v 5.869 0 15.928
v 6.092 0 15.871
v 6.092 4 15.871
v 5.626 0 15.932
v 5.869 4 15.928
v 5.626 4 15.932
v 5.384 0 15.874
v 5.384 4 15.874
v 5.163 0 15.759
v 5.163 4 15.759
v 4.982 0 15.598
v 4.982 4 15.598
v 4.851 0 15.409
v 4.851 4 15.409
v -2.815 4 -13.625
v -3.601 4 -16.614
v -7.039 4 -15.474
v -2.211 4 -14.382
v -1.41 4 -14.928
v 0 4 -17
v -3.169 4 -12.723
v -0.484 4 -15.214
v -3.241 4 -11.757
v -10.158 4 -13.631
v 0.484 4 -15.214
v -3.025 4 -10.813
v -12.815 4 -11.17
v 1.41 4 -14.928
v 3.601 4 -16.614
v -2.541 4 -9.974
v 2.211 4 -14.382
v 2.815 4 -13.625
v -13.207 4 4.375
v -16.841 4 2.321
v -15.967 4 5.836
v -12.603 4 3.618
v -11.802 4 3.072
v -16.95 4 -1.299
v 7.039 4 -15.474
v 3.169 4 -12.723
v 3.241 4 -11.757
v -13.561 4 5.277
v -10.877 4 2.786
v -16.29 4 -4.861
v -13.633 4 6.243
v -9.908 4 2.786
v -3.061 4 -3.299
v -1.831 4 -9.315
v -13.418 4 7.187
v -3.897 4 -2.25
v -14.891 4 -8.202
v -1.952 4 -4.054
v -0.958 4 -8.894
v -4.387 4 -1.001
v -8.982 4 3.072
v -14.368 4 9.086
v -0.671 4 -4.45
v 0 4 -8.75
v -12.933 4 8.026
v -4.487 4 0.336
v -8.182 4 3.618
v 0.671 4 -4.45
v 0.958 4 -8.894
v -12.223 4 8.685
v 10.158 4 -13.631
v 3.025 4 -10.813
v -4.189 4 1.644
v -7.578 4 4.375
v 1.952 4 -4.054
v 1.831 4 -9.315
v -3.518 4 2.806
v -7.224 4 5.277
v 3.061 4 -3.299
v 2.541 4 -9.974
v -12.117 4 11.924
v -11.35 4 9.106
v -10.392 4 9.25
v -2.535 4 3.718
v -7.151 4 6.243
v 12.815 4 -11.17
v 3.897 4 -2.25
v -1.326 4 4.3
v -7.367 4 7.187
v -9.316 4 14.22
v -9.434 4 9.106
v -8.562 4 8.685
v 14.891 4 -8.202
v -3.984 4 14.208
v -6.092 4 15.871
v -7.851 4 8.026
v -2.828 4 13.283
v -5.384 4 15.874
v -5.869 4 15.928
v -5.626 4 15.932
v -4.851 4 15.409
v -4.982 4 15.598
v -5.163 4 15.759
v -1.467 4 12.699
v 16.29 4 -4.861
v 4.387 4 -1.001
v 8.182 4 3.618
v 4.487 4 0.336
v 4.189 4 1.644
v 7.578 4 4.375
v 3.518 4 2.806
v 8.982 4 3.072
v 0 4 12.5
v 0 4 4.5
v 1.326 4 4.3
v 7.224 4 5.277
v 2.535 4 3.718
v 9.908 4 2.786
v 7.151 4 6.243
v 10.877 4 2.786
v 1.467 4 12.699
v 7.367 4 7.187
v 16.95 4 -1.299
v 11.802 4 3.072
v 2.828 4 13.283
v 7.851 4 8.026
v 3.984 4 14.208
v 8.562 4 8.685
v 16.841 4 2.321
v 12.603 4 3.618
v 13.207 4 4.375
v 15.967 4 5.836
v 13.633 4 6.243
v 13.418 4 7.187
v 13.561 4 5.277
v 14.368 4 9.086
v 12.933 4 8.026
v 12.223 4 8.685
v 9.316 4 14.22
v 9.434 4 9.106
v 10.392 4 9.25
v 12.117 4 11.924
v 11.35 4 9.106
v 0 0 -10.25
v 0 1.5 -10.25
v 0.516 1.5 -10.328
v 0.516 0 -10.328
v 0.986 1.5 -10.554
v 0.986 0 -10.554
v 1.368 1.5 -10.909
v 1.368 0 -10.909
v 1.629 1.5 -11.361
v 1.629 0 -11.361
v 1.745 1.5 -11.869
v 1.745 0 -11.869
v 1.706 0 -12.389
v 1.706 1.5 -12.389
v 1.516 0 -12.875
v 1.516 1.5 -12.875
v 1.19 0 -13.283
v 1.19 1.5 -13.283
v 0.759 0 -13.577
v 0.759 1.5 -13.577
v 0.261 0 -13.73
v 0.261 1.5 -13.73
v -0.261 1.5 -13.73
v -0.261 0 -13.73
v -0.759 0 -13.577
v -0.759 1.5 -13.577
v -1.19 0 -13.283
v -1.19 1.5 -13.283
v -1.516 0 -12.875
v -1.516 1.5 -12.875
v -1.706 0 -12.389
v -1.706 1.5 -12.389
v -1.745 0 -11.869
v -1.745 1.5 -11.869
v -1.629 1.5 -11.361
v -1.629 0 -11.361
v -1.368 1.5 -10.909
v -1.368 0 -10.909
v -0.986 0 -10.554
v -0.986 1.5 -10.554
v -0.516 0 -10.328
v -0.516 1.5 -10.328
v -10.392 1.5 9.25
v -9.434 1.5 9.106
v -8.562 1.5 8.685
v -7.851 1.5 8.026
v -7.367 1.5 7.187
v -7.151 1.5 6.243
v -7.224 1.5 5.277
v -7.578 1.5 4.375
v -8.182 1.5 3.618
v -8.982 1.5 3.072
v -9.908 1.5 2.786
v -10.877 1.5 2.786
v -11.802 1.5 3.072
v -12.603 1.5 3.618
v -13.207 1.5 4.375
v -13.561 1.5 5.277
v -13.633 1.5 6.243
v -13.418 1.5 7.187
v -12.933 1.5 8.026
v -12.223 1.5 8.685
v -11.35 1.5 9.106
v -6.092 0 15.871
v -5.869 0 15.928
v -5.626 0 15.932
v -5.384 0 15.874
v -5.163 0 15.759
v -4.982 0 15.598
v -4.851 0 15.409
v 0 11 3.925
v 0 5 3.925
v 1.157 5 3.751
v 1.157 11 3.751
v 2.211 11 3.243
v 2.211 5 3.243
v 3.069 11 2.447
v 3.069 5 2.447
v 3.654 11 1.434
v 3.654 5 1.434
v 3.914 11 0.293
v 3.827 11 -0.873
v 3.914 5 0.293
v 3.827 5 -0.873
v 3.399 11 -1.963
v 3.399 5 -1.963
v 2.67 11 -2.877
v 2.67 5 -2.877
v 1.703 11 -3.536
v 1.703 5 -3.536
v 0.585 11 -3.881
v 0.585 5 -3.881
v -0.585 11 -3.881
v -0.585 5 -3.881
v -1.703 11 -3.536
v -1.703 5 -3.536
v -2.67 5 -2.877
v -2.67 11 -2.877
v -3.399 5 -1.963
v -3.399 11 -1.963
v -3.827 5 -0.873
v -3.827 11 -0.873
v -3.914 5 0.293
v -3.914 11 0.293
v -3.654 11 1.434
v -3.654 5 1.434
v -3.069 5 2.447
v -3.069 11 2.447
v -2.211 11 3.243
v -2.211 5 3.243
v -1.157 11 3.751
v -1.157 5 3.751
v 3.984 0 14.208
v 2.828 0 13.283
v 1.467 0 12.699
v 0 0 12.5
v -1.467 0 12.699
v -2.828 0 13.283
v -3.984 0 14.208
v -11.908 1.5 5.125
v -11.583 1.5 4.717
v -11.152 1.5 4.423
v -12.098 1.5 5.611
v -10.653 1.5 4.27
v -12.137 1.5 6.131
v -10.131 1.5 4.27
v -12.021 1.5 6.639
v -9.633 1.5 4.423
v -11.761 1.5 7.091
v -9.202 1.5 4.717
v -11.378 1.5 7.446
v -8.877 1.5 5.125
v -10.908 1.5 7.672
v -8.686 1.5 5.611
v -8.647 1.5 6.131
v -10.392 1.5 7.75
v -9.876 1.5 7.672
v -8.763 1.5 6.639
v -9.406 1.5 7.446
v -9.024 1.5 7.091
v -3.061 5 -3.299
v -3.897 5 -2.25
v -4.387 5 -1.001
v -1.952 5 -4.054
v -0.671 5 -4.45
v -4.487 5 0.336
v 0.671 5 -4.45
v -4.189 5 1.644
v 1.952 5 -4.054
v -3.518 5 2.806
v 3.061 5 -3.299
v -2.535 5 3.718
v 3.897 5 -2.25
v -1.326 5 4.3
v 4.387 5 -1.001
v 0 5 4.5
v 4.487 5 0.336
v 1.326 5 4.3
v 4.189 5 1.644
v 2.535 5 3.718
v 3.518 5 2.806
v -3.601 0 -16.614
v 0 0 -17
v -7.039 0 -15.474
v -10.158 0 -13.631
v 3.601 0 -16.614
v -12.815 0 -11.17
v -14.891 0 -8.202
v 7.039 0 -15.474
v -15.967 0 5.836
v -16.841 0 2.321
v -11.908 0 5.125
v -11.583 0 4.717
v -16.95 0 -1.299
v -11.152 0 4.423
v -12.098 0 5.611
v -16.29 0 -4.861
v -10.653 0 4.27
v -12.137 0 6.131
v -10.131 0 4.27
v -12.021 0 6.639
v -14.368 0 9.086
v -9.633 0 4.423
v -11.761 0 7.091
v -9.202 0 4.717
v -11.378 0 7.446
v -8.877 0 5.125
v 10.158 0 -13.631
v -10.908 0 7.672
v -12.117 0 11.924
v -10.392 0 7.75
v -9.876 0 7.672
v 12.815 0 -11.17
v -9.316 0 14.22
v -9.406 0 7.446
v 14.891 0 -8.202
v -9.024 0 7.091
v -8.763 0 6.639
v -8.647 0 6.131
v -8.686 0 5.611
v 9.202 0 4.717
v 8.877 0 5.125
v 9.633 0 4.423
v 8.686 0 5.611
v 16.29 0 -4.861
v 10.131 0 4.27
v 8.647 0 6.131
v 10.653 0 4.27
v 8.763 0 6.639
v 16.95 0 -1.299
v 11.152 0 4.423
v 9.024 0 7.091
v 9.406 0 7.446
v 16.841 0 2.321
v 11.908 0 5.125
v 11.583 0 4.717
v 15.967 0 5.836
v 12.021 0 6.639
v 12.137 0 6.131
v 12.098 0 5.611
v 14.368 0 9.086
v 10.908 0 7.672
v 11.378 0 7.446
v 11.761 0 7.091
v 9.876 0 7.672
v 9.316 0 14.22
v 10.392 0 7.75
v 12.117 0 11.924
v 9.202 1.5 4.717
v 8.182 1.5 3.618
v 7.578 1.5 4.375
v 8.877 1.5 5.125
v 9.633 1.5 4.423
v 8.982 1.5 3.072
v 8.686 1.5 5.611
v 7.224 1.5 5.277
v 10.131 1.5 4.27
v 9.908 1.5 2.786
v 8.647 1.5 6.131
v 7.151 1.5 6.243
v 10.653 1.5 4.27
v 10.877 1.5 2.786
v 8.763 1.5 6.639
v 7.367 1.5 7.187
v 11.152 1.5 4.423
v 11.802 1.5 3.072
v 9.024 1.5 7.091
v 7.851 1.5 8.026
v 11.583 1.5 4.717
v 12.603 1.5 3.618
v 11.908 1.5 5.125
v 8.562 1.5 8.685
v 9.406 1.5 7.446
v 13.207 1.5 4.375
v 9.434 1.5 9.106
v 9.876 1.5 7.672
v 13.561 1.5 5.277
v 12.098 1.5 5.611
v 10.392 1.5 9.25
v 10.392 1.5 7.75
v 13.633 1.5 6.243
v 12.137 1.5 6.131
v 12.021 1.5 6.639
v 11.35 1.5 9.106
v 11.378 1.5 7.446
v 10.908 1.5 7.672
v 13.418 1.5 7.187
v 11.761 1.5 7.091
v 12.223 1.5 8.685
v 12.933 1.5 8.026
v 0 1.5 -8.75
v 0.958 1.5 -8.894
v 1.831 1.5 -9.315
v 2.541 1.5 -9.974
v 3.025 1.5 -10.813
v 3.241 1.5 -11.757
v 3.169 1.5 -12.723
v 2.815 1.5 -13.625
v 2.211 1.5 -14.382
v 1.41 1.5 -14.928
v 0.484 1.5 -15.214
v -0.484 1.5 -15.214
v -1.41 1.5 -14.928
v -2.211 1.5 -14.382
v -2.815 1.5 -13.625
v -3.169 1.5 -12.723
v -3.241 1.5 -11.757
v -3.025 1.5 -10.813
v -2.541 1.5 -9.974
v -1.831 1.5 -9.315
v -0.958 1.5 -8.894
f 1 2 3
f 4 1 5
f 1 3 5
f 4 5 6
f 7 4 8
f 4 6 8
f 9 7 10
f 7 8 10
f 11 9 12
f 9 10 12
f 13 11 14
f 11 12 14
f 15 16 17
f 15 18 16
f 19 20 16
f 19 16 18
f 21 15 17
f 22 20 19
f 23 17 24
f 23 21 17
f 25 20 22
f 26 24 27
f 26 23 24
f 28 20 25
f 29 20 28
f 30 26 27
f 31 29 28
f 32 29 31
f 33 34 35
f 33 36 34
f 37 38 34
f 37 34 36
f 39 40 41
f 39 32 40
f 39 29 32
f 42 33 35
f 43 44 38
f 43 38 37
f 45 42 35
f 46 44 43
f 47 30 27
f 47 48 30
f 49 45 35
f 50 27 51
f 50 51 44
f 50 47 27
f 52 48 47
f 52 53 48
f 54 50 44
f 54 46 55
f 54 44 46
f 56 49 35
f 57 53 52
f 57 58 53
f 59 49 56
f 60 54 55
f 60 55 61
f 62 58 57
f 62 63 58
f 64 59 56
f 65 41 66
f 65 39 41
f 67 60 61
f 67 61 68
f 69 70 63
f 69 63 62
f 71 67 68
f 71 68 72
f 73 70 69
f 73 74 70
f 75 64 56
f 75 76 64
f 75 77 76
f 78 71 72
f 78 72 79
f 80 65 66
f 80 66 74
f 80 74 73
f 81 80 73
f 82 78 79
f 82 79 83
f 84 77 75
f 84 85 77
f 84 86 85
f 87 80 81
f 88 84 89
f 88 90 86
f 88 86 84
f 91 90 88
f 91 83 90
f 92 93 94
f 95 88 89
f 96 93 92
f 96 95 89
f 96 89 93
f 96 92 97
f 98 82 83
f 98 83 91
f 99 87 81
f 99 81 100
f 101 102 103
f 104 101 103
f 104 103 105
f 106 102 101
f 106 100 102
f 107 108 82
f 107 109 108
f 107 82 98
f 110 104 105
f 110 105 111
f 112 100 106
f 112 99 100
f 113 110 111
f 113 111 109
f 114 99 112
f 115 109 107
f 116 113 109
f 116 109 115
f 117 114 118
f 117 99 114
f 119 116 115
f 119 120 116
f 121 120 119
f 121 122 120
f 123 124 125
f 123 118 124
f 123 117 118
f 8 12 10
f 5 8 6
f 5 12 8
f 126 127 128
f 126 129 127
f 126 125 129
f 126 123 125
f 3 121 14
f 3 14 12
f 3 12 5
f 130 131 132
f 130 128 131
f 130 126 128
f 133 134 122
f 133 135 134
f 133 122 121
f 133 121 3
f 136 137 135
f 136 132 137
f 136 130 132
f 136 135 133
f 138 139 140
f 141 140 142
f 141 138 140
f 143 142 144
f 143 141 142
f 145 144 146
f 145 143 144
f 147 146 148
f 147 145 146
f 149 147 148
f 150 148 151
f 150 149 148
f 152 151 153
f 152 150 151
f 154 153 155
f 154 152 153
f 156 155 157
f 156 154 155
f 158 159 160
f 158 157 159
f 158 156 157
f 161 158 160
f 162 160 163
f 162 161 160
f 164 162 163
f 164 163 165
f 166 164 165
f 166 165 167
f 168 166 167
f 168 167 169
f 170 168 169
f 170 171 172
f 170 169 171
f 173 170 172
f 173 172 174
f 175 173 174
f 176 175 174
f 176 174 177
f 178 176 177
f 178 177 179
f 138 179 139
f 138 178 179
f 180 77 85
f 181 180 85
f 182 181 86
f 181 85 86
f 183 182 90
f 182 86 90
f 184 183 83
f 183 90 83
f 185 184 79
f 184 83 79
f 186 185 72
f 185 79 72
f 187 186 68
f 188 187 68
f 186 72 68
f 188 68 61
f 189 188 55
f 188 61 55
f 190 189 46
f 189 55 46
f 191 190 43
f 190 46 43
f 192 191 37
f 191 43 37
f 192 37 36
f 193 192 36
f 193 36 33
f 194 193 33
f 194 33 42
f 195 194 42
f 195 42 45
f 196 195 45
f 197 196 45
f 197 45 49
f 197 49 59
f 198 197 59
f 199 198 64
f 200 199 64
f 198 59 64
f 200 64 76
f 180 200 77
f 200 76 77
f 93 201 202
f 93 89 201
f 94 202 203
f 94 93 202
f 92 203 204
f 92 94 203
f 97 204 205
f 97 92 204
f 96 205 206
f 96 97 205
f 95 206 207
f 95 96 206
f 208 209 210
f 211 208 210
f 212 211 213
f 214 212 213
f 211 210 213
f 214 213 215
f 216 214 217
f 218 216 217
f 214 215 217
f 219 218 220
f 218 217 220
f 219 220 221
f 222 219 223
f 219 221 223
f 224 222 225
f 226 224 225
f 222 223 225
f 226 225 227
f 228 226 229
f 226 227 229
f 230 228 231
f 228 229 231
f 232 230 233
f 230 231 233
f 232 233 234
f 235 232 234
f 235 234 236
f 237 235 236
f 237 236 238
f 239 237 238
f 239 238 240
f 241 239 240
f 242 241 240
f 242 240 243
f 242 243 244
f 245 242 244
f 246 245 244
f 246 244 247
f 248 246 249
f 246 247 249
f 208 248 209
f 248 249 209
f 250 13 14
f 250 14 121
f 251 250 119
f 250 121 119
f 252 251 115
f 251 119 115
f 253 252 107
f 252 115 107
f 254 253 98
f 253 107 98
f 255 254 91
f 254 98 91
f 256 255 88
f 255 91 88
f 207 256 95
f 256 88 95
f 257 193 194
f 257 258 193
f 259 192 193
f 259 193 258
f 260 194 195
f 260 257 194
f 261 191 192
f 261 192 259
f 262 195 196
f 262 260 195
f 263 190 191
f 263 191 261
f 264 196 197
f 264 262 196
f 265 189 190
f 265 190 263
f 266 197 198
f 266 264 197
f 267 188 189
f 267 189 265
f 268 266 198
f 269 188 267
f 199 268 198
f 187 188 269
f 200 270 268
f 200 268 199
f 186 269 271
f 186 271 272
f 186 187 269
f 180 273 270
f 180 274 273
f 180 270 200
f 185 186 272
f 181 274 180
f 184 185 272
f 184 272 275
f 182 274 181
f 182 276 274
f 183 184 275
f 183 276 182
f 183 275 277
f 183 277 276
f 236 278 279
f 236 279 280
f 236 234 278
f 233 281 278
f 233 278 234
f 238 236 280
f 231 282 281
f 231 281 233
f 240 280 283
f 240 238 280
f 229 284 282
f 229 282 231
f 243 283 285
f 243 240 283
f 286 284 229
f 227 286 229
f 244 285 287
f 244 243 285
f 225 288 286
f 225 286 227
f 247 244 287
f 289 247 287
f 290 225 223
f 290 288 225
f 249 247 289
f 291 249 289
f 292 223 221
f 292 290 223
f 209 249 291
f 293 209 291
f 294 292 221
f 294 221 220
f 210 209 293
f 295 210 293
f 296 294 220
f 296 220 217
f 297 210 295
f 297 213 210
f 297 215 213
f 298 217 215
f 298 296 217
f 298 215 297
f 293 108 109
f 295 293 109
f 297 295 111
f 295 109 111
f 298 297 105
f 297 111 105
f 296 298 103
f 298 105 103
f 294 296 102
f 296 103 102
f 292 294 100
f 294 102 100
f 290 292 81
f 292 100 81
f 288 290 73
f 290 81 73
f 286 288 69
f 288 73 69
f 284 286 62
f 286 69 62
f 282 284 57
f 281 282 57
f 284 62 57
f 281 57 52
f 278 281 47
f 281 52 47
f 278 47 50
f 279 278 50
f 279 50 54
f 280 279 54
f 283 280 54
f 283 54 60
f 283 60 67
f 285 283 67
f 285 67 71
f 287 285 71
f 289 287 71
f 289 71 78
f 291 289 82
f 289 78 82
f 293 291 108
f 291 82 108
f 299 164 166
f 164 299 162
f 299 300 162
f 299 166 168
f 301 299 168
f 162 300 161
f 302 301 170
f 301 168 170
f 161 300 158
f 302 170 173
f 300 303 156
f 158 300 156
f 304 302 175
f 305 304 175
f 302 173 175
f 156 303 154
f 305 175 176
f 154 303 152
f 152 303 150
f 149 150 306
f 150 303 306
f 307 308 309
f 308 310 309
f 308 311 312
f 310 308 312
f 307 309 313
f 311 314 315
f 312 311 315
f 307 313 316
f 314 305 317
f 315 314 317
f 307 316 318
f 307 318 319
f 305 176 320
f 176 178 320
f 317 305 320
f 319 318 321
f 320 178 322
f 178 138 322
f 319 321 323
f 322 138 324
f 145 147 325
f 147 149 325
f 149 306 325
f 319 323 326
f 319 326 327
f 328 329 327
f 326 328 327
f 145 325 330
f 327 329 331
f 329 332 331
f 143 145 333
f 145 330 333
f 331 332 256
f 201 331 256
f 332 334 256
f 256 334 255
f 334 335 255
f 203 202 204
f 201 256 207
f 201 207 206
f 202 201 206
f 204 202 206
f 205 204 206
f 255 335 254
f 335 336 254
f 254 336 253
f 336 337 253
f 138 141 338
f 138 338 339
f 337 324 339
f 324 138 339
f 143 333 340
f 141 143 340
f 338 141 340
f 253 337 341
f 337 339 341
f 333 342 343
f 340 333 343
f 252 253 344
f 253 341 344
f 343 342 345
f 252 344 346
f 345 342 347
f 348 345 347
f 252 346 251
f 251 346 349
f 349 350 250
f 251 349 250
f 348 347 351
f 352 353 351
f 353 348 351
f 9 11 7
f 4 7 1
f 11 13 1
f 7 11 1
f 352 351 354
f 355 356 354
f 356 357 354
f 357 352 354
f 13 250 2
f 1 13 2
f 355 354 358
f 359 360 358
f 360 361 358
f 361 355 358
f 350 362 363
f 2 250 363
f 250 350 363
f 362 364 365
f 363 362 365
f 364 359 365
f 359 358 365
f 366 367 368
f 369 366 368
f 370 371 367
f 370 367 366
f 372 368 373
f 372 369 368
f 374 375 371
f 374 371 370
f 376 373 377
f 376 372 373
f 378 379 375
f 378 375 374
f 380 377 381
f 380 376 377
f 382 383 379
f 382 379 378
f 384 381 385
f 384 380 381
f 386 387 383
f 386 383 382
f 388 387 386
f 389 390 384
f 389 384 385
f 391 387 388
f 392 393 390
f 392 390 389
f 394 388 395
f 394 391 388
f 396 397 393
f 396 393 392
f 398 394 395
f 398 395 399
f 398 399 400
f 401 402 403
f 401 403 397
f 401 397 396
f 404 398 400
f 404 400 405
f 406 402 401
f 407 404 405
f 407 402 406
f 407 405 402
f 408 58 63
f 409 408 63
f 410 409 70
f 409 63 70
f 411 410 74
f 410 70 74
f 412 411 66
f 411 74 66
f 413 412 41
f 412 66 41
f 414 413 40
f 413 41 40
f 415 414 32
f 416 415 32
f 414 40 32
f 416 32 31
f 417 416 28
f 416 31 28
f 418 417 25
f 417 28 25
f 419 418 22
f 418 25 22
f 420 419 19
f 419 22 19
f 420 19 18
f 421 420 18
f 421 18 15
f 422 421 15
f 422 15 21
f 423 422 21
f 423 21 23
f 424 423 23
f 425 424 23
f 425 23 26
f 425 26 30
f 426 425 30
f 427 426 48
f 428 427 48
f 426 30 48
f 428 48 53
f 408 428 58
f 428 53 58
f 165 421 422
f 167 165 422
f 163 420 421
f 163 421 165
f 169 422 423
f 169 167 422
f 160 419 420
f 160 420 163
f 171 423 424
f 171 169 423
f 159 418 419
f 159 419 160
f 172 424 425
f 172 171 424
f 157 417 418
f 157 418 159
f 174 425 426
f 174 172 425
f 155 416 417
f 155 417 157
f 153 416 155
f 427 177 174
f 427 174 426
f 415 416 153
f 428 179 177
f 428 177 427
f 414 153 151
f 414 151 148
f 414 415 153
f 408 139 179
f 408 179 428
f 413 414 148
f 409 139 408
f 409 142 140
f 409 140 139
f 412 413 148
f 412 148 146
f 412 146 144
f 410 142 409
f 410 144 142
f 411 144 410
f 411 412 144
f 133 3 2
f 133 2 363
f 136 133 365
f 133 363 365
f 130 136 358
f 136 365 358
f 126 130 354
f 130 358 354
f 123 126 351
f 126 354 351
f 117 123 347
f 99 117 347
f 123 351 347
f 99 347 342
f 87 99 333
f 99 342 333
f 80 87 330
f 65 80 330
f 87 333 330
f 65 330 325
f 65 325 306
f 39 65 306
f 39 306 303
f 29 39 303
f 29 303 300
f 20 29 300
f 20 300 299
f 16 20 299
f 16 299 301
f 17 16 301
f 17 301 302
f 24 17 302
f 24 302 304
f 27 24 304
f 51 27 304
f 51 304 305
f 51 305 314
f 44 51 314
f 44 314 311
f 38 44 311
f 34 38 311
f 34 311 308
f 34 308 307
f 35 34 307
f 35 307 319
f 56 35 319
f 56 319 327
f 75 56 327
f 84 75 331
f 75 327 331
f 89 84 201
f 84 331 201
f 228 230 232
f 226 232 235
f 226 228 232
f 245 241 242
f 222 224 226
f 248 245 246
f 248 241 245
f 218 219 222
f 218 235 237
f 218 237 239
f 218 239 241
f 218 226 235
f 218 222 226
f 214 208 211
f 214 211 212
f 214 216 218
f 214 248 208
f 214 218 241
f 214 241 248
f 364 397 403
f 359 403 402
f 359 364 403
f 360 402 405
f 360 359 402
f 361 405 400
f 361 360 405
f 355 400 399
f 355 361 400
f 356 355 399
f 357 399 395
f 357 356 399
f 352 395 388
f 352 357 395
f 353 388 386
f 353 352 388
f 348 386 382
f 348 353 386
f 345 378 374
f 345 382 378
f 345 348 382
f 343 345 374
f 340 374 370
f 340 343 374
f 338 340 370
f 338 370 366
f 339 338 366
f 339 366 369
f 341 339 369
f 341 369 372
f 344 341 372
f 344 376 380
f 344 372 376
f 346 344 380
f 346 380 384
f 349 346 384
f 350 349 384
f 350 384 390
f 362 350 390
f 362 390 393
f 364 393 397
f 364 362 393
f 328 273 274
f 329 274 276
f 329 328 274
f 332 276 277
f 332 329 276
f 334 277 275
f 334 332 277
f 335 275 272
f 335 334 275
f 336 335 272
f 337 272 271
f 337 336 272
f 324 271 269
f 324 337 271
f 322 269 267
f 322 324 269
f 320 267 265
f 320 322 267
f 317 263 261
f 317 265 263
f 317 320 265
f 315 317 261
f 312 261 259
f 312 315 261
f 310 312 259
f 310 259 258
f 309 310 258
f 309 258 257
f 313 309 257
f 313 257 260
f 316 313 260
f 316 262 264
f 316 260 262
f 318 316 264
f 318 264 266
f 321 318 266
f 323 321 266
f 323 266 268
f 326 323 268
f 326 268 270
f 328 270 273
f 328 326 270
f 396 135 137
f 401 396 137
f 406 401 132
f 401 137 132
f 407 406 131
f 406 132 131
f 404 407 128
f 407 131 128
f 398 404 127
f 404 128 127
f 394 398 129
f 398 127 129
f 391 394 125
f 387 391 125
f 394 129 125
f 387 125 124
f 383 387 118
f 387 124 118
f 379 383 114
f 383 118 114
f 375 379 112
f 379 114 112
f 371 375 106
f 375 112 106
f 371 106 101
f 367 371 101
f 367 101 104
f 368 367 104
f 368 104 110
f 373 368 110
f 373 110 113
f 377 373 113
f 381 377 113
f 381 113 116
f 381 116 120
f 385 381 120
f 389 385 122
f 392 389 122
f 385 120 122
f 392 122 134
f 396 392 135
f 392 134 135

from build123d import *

# Parameters (mm, degrees)
SKETCH1_R           = 17
SKETCH1_R_2         = 1.75
BOSS_EXTRUDE1_DEPTH = 4
SKETCH2_R           = 3.25
CUT_EXTRUDE1_DEPTH  = 2.5
SKETCH3_R           = 4.5
BOSS_EXTRUDE2_DEPTH = 1
SKETCH4_R           = 3.925
BOSS_EXTRUDE3_DEPTH = 6
CUT_EXTRUDE2_REACH  = 27.04
SKETCH5_R           = 5.5
FILLET1_R           = 1


with BuildPart() as part:
    # Sketch1 → Boss-Extrude1 (new body)
    with BuildSketch(Plane(origin=(0, 0, 0), x_dir=(1, 0, 0), z_dir=(0, 1, 0))):
        with Locations(Location((0, 0, 0), (0, 0, 270))):
            Circle(SKETCH1_R)
        with Locations(Location((0, 12, 0), (0, 0, 270))):
            Circle(SKETCH1_R_2, mode=Mode.SUBTRACT)
        with Locations(Location((10.392304845, -6, 0), (0, 0, 270))):
            Circle(SKETCH1_R_2, mode=Mode.SUBTRACT)
        with Locations(Location((-10.392304845, -6, 0), (0, 0, 270))):
            Circle(SKETCH1_R_2, mode=Mode.SUBTRACT)
    extrude(amount=BOSS_EXTRUDE1_DEPTH)

    # Sketch2 → Cut-Extrude1 (cut)
    with BuildSketch(Plane(origin=(0, 4, 0), x_dir=(1, 0, 0), z_dir=(0, 1, 0))):
        with Locations(Location((0, 12, 0), (0, 0, 270))):
            Circle(SKETCH2_R)
        with Locations(Location((10.392304845, -6, 0), (0, 0, 270))):
            Circle(SKETCH2_R)
        with Locations(Location((-10.392304845, -6, 0), (0, 0, 270))):
            Circle(SKETCH2_R)
    extrude(amount=-CUT_EXTRUDE1_DEPTH, mode=Mode.SUBTRACT)

    # Sketch3 → Boss-Extrude2 (add)
    with BuildSketch(Plane(origin=(0, 4, 0), x_dir=(1, 0, 0), z_dir=(0, 1, 0))):
        with Locations(Location((0, 0, 0), (0, 0, 270))):
            Circle(SKETCH3_R)
    extrude(amount=BOSS_EXTRUDE2_DEPTH)

    # Sketch4 → Boss-Extrude3 (add)
    with BuildSketch(Plane(origin=(0, 5, 0), x_dir=(1, 0, 0), z_dir=(0, 1, 0))):
        with Locations(Location((0, 0, 0), (0, 0, 270))):
            Circle(SKETCH4_R)
    extrude(amount=BOSS_EXTRUDE3_DEPTH)

    # Sketch5 → Cut-Extrude2 (cut, up to next)
    with BuildSketch(Plane(origin=(0, 4, 0), x_dir=(1, 0, 0), z_dir=(0, 1, 0)), mode=Mode.PRIVATE) as cut_extrude2_sk1:
        with Locations((0, -18)):
            Circle(SKETCH5_R)
    cut_extrude2_tool1 = extrude(cut_extrude2_sk1.sketch, amount=-CUT_EXTRUDE2_REACH, mode=Mode.PRIVATE) & part.part
    add(cut_extrude2_tool1.solids().sort_by_distance((0, 4, 18))[0], mode=Mode.SUBTRACT)

    # Fillet1
    fillet1_edges = [part.edges().sort_by_distance(p)[0] for p in [
        (-5.192768409, 2, 16.1875),
        (5.192768409, 2, 16.1875),
    ]]
    fillet(fillet1_edges, radius=FILLET1_R)


solid = part.part
